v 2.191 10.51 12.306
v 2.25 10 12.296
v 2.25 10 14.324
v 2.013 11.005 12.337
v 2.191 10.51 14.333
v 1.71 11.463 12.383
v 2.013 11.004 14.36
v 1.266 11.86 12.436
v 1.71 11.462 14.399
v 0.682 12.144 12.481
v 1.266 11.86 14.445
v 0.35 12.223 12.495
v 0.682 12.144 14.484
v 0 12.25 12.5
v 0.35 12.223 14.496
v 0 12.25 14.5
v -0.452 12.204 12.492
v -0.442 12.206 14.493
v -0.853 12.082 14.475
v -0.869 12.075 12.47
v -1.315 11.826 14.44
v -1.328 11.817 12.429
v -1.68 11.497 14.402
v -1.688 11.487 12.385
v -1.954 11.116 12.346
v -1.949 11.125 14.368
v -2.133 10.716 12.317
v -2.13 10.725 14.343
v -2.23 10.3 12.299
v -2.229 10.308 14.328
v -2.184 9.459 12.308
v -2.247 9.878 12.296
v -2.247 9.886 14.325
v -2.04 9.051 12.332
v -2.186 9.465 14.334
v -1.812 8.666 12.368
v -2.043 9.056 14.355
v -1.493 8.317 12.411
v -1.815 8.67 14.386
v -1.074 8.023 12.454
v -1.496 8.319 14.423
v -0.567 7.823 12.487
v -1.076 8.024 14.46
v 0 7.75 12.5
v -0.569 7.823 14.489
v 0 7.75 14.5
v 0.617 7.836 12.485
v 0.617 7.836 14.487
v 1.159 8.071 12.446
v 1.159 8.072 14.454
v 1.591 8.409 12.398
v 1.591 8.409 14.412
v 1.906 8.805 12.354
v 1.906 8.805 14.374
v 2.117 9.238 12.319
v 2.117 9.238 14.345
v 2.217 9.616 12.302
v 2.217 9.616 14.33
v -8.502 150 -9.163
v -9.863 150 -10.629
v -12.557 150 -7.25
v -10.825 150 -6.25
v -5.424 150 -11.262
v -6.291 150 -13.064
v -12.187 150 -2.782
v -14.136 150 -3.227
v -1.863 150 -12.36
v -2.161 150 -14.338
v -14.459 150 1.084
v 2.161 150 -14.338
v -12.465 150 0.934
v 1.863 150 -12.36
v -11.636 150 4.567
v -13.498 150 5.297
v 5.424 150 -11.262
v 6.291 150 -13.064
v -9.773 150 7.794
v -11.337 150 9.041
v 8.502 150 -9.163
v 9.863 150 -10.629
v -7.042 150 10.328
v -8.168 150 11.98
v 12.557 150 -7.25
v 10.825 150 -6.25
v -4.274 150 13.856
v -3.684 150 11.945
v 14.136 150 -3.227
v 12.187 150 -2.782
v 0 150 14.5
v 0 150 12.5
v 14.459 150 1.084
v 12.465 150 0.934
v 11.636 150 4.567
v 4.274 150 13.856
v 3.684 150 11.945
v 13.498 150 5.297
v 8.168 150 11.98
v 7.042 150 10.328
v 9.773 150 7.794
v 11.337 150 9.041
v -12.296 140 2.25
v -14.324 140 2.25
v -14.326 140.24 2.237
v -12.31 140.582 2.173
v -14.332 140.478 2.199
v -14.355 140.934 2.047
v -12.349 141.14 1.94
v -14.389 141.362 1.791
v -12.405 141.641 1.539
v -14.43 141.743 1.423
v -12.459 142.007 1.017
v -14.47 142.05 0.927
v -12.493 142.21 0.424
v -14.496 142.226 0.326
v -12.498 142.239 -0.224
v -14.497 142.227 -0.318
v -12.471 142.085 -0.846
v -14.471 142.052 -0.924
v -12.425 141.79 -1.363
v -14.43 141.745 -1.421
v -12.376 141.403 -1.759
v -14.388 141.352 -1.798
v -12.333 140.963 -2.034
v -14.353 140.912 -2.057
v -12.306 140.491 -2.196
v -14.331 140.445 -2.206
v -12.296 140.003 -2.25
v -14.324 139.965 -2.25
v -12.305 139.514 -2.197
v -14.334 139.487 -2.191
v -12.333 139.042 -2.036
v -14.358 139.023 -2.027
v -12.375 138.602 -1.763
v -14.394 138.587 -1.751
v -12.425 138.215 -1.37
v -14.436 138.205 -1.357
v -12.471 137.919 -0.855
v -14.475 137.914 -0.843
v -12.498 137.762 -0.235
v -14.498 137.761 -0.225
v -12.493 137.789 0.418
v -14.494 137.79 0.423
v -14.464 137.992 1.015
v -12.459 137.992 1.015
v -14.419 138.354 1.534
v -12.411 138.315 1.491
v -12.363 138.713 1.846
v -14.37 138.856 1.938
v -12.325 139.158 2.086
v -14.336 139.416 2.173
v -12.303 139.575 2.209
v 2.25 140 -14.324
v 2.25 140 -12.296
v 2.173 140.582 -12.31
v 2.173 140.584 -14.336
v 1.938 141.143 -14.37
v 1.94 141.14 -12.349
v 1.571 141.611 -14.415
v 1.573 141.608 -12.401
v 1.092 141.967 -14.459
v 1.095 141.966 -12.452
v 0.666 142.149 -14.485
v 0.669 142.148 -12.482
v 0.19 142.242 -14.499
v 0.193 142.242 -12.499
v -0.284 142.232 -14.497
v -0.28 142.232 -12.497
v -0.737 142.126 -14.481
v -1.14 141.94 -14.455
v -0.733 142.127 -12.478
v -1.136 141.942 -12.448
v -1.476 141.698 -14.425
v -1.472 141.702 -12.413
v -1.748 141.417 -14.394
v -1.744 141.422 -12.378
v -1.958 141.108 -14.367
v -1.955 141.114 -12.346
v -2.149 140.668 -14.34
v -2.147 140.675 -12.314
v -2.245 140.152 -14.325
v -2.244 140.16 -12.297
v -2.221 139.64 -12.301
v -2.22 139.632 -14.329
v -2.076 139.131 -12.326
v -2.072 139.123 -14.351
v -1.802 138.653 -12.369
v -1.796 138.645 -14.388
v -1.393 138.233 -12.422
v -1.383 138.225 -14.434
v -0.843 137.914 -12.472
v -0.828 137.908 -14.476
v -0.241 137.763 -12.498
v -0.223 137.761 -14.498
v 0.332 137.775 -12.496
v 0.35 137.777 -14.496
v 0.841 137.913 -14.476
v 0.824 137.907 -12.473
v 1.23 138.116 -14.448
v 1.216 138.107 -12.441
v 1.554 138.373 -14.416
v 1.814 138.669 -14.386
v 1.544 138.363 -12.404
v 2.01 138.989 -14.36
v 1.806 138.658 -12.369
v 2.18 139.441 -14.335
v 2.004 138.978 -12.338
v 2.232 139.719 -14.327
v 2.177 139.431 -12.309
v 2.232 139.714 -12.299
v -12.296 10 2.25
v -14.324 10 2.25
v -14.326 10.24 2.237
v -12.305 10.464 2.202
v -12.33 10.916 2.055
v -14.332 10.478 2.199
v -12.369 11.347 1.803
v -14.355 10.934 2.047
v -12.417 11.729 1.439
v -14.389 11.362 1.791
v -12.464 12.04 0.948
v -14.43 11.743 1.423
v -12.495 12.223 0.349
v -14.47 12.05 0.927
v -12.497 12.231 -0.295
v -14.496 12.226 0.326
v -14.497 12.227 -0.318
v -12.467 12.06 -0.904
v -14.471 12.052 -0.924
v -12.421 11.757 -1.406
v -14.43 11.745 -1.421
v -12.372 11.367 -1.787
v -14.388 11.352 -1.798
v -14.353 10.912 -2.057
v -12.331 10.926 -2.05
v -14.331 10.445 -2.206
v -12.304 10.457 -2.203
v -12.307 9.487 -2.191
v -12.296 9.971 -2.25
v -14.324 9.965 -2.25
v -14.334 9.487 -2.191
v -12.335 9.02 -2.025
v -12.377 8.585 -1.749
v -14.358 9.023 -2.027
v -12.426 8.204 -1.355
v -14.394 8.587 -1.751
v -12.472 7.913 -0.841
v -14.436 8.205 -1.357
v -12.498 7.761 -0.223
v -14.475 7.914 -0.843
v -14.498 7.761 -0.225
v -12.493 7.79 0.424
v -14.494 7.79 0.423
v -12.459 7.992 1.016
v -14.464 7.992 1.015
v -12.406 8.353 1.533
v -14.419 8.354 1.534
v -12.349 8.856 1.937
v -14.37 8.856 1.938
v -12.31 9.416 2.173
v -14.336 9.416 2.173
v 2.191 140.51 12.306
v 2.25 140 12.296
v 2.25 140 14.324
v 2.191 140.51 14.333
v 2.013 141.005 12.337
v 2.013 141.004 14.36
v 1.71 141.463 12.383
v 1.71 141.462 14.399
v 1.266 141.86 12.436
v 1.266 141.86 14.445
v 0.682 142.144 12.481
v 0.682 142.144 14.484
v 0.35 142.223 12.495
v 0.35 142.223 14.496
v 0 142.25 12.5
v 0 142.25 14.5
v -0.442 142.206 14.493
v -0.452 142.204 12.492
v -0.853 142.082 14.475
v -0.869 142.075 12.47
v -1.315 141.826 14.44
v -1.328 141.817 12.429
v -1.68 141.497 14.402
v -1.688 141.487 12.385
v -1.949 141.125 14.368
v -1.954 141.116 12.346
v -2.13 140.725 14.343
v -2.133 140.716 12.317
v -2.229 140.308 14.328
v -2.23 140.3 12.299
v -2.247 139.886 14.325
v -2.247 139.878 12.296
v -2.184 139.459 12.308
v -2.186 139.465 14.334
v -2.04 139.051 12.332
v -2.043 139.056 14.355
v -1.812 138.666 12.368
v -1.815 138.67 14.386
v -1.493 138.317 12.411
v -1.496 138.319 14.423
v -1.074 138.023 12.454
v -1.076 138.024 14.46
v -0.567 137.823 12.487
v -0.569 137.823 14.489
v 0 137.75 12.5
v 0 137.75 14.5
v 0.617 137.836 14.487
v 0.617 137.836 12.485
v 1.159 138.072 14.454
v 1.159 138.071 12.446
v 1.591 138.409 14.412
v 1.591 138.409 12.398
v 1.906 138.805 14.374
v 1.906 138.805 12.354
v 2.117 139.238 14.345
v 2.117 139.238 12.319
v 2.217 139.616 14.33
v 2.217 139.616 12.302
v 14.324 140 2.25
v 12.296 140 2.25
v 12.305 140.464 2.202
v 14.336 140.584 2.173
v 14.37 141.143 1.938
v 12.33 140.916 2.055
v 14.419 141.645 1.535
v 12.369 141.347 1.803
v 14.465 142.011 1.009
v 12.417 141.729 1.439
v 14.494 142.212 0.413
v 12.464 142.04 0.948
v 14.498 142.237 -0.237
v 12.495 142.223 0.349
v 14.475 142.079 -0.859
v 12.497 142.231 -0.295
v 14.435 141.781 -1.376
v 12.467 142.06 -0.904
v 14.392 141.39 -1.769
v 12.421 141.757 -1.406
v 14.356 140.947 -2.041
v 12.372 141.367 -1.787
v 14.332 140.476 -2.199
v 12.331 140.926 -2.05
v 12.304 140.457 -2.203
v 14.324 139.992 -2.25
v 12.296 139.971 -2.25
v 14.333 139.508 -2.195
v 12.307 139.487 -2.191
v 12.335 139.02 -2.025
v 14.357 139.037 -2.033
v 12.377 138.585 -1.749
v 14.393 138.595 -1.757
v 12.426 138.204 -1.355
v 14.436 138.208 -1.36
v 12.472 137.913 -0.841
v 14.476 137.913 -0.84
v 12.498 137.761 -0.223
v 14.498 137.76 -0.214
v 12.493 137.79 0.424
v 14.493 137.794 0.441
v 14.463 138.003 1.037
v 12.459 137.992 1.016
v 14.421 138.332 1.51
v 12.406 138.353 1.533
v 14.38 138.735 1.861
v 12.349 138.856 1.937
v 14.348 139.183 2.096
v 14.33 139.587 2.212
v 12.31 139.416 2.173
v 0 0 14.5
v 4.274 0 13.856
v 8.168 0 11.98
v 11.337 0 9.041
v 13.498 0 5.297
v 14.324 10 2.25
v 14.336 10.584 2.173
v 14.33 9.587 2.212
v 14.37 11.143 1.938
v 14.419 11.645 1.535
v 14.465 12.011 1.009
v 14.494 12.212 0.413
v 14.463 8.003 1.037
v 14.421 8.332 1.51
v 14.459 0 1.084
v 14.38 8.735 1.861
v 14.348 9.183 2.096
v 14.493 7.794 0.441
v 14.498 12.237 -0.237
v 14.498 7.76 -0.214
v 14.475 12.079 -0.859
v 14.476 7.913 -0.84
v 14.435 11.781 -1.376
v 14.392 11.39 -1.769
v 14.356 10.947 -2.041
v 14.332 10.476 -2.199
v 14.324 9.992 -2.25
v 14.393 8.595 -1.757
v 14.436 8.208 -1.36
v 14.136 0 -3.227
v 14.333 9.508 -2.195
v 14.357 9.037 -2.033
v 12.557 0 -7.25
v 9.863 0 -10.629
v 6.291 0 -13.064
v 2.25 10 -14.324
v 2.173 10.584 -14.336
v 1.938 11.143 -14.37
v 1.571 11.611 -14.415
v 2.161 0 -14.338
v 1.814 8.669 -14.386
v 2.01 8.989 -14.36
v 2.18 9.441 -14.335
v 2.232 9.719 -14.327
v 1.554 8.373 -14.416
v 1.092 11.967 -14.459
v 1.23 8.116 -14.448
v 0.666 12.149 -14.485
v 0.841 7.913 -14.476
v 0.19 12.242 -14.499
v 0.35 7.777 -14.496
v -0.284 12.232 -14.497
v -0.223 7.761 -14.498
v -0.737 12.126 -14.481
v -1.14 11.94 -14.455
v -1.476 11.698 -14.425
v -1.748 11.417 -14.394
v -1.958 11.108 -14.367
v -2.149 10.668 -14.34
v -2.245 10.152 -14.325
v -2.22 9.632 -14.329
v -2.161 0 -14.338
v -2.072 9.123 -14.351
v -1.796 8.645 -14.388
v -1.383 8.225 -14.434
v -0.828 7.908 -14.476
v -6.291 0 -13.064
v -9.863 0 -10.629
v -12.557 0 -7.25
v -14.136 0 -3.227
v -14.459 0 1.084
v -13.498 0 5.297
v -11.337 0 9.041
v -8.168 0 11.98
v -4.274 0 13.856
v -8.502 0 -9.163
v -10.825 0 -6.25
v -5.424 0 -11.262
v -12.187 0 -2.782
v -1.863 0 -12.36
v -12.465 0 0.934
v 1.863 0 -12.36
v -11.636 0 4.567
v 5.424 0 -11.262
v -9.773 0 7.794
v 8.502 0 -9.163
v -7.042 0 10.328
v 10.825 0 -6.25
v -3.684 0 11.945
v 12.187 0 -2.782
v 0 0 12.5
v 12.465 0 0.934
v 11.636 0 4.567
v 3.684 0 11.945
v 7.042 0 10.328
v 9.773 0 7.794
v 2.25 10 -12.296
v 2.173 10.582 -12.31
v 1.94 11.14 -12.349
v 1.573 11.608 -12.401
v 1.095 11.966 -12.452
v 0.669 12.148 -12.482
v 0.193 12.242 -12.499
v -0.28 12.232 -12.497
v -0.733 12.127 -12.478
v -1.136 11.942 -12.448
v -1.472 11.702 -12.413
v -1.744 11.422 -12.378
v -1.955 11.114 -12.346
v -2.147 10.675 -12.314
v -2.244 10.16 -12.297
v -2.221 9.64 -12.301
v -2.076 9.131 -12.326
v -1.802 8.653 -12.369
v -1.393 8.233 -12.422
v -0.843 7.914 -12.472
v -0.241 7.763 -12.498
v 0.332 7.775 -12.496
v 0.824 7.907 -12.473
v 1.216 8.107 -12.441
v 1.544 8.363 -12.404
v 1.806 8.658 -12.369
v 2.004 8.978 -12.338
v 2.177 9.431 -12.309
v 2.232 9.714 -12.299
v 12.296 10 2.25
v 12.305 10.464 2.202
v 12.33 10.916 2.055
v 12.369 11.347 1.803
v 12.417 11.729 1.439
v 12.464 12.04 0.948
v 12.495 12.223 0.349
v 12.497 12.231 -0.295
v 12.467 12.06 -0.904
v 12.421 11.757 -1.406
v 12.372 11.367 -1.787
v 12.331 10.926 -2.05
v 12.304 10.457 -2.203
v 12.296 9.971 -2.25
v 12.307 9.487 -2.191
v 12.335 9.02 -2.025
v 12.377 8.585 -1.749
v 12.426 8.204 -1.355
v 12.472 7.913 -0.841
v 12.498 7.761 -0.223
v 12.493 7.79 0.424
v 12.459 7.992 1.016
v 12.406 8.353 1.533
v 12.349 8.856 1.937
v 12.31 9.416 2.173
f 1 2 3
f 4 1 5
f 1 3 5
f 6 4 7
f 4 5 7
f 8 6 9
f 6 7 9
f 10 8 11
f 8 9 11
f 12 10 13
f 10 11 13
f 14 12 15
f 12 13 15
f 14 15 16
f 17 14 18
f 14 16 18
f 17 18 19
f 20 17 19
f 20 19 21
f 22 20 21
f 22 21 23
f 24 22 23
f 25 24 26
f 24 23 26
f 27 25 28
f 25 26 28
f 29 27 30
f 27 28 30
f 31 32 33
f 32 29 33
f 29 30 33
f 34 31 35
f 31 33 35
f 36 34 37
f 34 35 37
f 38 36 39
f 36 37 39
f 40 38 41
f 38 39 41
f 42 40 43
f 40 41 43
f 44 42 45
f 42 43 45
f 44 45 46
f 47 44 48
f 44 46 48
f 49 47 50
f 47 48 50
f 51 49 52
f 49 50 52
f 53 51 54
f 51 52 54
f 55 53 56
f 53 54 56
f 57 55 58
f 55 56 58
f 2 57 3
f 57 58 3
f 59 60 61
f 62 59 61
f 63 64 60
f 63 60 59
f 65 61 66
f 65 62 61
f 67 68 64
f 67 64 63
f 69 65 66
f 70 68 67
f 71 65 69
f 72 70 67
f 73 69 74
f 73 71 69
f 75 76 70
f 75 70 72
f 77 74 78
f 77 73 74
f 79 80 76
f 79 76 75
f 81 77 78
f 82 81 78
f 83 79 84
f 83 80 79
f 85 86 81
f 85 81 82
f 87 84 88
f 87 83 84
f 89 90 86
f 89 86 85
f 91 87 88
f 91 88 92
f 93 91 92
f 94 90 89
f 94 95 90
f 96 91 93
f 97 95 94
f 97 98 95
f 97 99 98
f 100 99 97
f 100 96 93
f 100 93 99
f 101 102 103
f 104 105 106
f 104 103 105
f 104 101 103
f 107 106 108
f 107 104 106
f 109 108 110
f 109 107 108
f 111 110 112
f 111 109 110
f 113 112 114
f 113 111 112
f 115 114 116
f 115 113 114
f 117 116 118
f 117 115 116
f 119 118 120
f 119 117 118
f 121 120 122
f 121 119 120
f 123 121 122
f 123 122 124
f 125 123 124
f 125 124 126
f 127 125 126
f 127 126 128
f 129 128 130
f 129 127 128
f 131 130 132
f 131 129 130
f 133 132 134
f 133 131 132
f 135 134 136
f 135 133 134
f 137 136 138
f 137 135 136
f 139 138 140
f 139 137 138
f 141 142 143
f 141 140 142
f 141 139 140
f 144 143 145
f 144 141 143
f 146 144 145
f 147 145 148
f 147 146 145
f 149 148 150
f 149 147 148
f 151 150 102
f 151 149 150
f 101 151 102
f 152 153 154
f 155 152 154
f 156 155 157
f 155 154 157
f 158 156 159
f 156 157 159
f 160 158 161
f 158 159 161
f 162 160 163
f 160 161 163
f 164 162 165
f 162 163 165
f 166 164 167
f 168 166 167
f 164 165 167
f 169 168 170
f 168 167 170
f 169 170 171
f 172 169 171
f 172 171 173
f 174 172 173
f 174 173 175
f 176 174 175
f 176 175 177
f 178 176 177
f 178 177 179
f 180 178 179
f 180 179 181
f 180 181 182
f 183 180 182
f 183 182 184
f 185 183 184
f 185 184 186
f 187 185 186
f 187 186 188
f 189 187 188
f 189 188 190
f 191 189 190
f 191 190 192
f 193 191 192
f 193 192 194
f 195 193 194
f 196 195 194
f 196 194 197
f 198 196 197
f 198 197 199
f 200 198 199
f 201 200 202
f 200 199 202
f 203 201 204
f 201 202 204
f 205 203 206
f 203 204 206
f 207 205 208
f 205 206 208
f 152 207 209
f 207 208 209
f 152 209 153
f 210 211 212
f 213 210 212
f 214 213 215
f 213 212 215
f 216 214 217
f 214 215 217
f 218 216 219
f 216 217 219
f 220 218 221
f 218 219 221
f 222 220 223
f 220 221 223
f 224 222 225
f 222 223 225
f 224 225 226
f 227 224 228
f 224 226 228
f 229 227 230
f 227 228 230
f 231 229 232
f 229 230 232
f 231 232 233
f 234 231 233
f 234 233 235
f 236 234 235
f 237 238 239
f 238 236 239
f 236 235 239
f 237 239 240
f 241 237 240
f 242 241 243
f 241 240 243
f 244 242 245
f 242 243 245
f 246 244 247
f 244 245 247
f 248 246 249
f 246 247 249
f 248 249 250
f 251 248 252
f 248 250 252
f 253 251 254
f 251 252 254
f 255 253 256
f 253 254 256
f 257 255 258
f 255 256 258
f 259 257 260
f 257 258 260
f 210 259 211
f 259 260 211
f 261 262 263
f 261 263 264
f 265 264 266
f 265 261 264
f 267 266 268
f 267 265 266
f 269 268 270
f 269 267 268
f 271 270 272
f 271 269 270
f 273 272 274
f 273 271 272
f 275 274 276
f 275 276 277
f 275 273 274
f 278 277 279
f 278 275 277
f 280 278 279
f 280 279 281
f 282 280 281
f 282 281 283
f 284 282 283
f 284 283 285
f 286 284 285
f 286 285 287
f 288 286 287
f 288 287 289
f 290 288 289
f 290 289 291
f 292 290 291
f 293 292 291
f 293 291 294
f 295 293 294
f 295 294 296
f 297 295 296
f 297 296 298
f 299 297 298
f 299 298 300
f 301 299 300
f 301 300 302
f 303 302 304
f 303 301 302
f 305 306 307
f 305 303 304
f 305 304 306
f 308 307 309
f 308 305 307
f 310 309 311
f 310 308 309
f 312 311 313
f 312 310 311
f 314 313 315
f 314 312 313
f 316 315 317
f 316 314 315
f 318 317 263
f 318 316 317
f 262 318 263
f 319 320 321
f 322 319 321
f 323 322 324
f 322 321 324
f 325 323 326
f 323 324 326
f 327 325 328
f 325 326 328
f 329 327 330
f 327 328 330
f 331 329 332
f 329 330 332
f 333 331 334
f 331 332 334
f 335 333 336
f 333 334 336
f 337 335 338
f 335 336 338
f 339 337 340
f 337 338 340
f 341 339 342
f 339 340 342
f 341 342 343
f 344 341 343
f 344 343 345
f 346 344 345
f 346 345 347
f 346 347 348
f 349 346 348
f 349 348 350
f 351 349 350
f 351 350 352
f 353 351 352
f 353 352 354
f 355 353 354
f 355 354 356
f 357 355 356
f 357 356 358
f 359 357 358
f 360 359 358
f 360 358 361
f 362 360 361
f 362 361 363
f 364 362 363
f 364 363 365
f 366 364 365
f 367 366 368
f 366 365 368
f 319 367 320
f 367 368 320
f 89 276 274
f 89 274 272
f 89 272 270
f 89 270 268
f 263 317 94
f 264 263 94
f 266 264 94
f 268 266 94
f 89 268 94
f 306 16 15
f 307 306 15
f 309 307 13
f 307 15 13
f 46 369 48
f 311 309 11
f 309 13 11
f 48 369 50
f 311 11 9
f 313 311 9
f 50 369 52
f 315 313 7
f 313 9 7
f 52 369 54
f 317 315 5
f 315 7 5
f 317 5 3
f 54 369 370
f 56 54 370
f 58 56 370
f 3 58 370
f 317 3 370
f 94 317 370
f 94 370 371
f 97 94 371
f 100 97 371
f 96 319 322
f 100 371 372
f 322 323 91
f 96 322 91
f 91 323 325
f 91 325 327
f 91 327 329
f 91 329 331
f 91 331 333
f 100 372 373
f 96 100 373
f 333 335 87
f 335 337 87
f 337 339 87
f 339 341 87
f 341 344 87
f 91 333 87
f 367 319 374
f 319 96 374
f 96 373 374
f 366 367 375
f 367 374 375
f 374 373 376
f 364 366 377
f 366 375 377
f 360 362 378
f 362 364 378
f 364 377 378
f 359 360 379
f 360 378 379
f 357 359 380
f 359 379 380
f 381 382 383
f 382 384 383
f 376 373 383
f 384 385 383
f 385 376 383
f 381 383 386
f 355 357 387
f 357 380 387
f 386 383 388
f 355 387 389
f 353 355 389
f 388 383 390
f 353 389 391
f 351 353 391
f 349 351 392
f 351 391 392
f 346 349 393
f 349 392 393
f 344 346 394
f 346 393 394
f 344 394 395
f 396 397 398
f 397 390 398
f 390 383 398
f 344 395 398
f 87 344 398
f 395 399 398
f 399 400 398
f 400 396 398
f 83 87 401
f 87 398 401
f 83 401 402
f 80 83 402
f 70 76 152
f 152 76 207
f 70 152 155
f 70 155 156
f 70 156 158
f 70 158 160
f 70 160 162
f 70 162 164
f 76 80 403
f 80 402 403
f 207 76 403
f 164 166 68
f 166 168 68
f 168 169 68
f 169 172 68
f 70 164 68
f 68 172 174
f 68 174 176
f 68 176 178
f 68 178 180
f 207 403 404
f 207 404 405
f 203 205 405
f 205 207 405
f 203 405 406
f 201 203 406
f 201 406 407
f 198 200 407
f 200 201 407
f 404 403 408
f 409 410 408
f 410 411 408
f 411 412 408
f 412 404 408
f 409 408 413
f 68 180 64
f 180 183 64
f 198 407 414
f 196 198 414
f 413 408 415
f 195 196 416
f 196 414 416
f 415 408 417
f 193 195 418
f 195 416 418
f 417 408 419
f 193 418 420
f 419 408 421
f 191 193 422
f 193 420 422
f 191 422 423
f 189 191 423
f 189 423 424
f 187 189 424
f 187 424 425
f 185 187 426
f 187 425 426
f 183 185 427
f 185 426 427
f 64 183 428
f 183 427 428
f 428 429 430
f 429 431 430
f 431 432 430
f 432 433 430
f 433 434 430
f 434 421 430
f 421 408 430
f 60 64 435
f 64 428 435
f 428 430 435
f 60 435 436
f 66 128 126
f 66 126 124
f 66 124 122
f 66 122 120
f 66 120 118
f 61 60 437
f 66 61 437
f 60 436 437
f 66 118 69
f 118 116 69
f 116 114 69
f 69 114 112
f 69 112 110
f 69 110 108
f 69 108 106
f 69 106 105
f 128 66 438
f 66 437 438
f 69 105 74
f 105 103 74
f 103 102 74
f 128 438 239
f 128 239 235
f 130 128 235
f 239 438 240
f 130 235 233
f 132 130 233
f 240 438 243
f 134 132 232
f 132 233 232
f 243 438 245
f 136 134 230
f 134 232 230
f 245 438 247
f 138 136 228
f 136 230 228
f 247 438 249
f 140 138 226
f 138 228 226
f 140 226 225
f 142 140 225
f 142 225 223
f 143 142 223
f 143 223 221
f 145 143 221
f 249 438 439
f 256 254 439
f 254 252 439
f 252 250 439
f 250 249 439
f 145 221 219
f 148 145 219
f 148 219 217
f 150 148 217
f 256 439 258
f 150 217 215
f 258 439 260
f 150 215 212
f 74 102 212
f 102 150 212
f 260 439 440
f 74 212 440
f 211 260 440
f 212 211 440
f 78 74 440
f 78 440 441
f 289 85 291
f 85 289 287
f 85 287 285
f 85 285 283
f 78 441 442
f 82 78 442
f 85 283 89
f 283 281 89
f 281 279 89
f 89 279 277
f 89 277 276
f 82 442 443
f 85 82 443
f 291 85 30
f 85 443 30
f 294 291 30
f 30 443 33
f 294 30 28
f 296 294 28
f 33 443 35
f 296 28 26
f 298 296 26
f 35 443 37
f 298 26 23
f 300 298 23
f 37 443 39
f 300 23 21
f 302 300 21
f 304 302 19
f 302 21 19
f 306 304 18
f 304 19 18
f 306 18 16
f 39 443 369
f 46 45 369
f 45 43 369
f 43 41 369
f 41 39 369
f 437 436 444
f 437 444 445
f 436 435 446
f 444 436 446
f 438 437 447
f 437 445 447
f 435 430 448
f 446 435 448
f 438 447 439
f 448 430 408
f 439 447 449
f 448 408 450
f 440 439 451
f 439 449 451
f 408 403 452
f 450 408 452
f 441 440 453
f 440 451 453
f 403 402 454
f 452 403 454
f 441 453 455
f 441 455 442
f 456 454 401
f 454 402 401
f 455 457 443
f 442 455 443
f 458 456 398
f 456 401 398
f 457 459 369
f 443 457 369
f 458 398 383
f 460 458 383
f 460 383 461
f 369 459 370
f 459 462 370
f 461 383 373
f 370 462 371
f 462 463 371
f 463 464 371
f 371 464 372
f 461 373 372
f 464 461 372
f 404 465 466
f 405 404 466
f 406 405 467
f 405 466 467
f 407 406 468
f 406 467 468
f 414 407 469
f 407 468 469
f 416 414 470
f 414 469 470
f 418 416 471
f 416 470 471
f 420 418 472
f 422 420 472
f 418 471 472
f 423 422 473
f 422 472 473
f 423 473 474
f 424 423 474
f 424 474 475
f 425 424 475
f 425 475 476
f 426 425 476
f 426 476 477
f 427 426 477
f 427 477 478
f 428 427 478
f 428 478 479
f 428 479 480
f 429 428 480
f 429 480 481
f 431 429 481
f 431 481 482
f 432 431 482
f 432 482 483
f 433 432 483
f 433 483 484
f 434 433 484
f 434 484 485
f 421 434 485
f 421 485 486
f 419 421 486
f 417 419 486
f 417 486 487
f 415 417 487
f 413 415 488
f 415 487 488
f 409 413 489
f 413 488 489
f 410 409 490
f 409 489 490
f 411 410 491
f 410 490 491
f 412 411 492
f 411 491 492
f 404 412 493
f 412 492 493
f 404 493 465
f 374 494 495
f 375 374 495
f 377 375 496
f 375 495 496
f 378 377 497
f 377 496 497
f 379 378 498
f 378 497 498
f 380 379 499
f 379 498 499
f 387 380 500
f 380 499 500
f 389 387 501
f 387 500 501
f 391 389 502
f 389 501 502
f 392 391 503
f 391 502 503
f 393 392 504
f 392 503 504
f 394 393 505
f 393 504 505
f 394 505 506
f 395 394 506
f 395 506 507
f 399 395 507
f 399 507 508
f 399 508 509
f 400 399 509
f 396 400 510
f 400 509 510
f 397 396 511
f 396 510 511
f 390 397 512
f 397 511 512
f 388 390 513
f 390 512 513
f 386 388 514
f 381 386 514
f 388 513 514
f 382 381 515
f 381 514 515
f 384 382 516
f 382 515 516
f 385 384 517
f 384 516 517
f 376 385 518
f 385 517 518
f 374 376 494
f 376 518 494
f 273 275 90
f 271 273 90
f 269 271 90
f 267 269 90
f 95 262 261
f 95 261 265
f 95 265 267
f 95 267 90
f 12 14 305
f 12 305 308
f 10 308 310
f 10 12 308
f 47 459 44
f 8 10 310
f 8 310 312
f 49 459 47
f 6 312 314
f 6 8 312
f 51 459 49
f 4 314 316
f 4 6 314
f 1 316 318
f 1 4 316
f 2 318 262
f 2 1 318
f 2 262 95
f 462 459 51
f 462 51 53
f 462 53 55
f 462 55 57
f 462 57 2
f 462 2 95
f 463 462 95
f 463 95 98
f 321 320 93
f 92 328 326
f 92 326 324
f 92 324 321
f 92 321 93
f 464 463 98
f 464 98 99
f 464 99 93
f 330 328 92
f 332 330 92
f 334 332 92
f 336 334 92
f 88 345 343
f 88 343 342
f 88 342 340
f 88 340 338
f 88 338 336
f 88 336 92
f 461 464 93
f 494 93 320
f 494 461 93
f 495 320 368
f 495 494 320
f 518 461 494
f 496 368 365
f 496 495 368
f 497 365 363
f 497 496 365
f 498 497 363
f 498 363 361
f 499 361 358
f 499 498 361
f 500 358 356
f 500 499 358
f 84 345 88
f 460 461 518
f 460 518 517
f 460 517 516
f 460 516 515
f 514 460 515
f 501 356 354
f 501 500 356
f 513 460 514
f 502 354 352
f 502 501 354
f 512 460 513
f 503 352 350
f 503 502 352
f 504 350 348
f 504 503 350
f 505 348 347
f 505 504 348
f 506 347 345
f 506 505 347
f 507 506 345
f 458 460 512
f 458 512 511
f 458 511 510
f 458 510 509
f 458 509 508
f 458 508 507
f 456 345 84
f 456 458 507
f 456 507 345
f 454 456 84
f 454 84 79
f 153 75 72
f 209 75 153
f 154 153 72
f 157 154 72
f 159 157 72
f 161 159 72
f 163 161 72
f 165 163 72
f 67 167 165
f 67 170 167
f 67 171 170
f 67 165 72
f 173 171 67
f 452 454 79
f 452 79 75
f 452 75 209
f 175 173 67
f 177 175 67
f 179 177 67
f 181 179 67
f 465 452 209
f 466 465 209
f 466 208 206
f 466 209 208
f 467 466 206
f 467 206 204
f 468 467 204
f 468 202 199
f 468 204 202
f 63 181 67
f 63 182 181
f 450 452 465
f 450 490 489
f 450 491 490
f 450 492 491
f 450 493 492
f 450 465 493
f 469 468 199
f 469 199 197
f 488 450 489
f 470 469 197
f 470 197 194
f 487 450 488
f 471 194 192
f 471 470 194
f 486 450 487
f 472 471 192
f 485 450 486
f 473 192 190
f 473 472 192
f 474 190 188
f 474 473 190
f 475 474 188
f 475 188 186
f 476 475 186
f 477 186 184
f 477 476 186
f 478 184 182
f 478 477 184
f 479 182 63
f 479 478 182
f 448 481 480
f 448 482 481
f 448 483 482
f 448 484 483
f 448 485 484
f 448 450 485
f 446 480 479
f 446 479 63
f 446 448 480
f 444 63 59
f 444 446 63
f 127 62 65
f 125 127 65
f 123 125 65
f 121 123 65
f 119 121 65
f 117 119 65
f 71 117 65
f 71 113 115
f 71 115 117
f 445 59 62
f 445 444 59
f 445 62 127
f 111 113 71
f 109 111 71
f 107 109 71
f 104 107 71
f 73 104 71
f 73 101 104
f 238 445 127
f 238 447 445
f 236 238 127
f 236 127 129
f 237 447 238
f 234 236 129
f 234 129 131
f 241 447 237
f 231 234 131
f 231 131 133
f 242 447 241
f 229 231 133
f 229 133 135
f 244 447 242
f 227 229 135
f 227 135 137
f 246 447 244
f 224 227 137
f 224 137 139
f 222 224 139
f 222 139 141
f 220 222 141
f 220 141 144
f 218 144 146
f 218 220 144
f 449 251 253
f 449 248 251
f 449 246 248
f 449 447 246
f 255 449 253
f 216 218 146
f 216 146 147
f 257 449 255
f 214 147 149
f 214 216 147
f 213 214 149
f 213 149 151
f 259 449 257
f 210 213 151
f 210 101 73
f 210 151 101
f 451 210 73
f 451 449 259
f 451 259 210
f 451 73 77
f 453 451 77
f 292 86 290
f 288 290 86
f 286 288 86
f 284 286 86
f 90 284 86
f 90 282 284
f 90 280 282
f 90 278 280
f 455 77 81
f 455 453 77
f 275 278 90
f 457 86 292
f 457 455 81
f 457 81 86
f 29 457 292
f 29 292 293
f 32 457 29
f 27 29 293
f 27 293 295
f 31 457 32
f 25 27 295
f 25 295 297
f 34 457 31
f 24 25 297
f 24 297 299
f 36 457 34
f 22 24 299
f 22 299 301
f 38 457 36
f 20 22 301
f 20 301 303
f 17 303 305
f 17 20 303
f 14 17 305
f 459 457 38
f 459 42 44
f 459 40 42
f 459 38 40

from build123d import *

# Parameters (mm, degrees)
SKETCH1_R           = 14.5
SKETCH1_R_2         = 12.5
BOSS_EXTRUDE1_DEPTH = 150
SKETCH2_R           = 2.25
CUT_EXTRUDE1_DEPTH  = 152.395178259
CIRPATTERN1_COUNT   = 4


with BuildPart() as part:
    # Sketch1 → Boss-Extrude1 (new body)
    with BuildSketch(Plane(origin=(0, 0, 0), x_dir=(1, 0, 0), z_dir=(0, 1, 0))):
        with Locations(Location((0, 0, 0), (0, 0, 270))):
            Circle(SKETCH1_R)
        with Locations(Location((0, 0, 0), (0, 0, 270))):
            Circle(SKETCH1_R_2, mode=Mode.SUBTRACT)
    extrude(amount=BOSS_EXTRUDE1_DEPTH)

    # Sketch2 → Cut-Extrude1 (cut, symmetric)
    with BuildSketch(Plane.XY):
        with Locations((0, 140)):
            Circle(SKETCH2_R)
        with Locations((0, 10)):
            Circle(SKETCH2_R)
    cut_extrude1 = extrude(amount=CUT_EXTRUDE1_DEPTH, both=True, mode=Mode.SUBTRACT)

    # CirPattern1: Cut-Extrude1 ×4 about axis
    cirpattern1_axis = Axis((0, 150, 0), (0, -1, 0))
    for i in range(1, CIRPATTERN1_COUNT):
        add(cut_extrude1.rotate(cirpattern1_axis, i * 360 / CIRPATTERN1_COUNT), mode=Mode.SUBTRACT)


solid = part.part
